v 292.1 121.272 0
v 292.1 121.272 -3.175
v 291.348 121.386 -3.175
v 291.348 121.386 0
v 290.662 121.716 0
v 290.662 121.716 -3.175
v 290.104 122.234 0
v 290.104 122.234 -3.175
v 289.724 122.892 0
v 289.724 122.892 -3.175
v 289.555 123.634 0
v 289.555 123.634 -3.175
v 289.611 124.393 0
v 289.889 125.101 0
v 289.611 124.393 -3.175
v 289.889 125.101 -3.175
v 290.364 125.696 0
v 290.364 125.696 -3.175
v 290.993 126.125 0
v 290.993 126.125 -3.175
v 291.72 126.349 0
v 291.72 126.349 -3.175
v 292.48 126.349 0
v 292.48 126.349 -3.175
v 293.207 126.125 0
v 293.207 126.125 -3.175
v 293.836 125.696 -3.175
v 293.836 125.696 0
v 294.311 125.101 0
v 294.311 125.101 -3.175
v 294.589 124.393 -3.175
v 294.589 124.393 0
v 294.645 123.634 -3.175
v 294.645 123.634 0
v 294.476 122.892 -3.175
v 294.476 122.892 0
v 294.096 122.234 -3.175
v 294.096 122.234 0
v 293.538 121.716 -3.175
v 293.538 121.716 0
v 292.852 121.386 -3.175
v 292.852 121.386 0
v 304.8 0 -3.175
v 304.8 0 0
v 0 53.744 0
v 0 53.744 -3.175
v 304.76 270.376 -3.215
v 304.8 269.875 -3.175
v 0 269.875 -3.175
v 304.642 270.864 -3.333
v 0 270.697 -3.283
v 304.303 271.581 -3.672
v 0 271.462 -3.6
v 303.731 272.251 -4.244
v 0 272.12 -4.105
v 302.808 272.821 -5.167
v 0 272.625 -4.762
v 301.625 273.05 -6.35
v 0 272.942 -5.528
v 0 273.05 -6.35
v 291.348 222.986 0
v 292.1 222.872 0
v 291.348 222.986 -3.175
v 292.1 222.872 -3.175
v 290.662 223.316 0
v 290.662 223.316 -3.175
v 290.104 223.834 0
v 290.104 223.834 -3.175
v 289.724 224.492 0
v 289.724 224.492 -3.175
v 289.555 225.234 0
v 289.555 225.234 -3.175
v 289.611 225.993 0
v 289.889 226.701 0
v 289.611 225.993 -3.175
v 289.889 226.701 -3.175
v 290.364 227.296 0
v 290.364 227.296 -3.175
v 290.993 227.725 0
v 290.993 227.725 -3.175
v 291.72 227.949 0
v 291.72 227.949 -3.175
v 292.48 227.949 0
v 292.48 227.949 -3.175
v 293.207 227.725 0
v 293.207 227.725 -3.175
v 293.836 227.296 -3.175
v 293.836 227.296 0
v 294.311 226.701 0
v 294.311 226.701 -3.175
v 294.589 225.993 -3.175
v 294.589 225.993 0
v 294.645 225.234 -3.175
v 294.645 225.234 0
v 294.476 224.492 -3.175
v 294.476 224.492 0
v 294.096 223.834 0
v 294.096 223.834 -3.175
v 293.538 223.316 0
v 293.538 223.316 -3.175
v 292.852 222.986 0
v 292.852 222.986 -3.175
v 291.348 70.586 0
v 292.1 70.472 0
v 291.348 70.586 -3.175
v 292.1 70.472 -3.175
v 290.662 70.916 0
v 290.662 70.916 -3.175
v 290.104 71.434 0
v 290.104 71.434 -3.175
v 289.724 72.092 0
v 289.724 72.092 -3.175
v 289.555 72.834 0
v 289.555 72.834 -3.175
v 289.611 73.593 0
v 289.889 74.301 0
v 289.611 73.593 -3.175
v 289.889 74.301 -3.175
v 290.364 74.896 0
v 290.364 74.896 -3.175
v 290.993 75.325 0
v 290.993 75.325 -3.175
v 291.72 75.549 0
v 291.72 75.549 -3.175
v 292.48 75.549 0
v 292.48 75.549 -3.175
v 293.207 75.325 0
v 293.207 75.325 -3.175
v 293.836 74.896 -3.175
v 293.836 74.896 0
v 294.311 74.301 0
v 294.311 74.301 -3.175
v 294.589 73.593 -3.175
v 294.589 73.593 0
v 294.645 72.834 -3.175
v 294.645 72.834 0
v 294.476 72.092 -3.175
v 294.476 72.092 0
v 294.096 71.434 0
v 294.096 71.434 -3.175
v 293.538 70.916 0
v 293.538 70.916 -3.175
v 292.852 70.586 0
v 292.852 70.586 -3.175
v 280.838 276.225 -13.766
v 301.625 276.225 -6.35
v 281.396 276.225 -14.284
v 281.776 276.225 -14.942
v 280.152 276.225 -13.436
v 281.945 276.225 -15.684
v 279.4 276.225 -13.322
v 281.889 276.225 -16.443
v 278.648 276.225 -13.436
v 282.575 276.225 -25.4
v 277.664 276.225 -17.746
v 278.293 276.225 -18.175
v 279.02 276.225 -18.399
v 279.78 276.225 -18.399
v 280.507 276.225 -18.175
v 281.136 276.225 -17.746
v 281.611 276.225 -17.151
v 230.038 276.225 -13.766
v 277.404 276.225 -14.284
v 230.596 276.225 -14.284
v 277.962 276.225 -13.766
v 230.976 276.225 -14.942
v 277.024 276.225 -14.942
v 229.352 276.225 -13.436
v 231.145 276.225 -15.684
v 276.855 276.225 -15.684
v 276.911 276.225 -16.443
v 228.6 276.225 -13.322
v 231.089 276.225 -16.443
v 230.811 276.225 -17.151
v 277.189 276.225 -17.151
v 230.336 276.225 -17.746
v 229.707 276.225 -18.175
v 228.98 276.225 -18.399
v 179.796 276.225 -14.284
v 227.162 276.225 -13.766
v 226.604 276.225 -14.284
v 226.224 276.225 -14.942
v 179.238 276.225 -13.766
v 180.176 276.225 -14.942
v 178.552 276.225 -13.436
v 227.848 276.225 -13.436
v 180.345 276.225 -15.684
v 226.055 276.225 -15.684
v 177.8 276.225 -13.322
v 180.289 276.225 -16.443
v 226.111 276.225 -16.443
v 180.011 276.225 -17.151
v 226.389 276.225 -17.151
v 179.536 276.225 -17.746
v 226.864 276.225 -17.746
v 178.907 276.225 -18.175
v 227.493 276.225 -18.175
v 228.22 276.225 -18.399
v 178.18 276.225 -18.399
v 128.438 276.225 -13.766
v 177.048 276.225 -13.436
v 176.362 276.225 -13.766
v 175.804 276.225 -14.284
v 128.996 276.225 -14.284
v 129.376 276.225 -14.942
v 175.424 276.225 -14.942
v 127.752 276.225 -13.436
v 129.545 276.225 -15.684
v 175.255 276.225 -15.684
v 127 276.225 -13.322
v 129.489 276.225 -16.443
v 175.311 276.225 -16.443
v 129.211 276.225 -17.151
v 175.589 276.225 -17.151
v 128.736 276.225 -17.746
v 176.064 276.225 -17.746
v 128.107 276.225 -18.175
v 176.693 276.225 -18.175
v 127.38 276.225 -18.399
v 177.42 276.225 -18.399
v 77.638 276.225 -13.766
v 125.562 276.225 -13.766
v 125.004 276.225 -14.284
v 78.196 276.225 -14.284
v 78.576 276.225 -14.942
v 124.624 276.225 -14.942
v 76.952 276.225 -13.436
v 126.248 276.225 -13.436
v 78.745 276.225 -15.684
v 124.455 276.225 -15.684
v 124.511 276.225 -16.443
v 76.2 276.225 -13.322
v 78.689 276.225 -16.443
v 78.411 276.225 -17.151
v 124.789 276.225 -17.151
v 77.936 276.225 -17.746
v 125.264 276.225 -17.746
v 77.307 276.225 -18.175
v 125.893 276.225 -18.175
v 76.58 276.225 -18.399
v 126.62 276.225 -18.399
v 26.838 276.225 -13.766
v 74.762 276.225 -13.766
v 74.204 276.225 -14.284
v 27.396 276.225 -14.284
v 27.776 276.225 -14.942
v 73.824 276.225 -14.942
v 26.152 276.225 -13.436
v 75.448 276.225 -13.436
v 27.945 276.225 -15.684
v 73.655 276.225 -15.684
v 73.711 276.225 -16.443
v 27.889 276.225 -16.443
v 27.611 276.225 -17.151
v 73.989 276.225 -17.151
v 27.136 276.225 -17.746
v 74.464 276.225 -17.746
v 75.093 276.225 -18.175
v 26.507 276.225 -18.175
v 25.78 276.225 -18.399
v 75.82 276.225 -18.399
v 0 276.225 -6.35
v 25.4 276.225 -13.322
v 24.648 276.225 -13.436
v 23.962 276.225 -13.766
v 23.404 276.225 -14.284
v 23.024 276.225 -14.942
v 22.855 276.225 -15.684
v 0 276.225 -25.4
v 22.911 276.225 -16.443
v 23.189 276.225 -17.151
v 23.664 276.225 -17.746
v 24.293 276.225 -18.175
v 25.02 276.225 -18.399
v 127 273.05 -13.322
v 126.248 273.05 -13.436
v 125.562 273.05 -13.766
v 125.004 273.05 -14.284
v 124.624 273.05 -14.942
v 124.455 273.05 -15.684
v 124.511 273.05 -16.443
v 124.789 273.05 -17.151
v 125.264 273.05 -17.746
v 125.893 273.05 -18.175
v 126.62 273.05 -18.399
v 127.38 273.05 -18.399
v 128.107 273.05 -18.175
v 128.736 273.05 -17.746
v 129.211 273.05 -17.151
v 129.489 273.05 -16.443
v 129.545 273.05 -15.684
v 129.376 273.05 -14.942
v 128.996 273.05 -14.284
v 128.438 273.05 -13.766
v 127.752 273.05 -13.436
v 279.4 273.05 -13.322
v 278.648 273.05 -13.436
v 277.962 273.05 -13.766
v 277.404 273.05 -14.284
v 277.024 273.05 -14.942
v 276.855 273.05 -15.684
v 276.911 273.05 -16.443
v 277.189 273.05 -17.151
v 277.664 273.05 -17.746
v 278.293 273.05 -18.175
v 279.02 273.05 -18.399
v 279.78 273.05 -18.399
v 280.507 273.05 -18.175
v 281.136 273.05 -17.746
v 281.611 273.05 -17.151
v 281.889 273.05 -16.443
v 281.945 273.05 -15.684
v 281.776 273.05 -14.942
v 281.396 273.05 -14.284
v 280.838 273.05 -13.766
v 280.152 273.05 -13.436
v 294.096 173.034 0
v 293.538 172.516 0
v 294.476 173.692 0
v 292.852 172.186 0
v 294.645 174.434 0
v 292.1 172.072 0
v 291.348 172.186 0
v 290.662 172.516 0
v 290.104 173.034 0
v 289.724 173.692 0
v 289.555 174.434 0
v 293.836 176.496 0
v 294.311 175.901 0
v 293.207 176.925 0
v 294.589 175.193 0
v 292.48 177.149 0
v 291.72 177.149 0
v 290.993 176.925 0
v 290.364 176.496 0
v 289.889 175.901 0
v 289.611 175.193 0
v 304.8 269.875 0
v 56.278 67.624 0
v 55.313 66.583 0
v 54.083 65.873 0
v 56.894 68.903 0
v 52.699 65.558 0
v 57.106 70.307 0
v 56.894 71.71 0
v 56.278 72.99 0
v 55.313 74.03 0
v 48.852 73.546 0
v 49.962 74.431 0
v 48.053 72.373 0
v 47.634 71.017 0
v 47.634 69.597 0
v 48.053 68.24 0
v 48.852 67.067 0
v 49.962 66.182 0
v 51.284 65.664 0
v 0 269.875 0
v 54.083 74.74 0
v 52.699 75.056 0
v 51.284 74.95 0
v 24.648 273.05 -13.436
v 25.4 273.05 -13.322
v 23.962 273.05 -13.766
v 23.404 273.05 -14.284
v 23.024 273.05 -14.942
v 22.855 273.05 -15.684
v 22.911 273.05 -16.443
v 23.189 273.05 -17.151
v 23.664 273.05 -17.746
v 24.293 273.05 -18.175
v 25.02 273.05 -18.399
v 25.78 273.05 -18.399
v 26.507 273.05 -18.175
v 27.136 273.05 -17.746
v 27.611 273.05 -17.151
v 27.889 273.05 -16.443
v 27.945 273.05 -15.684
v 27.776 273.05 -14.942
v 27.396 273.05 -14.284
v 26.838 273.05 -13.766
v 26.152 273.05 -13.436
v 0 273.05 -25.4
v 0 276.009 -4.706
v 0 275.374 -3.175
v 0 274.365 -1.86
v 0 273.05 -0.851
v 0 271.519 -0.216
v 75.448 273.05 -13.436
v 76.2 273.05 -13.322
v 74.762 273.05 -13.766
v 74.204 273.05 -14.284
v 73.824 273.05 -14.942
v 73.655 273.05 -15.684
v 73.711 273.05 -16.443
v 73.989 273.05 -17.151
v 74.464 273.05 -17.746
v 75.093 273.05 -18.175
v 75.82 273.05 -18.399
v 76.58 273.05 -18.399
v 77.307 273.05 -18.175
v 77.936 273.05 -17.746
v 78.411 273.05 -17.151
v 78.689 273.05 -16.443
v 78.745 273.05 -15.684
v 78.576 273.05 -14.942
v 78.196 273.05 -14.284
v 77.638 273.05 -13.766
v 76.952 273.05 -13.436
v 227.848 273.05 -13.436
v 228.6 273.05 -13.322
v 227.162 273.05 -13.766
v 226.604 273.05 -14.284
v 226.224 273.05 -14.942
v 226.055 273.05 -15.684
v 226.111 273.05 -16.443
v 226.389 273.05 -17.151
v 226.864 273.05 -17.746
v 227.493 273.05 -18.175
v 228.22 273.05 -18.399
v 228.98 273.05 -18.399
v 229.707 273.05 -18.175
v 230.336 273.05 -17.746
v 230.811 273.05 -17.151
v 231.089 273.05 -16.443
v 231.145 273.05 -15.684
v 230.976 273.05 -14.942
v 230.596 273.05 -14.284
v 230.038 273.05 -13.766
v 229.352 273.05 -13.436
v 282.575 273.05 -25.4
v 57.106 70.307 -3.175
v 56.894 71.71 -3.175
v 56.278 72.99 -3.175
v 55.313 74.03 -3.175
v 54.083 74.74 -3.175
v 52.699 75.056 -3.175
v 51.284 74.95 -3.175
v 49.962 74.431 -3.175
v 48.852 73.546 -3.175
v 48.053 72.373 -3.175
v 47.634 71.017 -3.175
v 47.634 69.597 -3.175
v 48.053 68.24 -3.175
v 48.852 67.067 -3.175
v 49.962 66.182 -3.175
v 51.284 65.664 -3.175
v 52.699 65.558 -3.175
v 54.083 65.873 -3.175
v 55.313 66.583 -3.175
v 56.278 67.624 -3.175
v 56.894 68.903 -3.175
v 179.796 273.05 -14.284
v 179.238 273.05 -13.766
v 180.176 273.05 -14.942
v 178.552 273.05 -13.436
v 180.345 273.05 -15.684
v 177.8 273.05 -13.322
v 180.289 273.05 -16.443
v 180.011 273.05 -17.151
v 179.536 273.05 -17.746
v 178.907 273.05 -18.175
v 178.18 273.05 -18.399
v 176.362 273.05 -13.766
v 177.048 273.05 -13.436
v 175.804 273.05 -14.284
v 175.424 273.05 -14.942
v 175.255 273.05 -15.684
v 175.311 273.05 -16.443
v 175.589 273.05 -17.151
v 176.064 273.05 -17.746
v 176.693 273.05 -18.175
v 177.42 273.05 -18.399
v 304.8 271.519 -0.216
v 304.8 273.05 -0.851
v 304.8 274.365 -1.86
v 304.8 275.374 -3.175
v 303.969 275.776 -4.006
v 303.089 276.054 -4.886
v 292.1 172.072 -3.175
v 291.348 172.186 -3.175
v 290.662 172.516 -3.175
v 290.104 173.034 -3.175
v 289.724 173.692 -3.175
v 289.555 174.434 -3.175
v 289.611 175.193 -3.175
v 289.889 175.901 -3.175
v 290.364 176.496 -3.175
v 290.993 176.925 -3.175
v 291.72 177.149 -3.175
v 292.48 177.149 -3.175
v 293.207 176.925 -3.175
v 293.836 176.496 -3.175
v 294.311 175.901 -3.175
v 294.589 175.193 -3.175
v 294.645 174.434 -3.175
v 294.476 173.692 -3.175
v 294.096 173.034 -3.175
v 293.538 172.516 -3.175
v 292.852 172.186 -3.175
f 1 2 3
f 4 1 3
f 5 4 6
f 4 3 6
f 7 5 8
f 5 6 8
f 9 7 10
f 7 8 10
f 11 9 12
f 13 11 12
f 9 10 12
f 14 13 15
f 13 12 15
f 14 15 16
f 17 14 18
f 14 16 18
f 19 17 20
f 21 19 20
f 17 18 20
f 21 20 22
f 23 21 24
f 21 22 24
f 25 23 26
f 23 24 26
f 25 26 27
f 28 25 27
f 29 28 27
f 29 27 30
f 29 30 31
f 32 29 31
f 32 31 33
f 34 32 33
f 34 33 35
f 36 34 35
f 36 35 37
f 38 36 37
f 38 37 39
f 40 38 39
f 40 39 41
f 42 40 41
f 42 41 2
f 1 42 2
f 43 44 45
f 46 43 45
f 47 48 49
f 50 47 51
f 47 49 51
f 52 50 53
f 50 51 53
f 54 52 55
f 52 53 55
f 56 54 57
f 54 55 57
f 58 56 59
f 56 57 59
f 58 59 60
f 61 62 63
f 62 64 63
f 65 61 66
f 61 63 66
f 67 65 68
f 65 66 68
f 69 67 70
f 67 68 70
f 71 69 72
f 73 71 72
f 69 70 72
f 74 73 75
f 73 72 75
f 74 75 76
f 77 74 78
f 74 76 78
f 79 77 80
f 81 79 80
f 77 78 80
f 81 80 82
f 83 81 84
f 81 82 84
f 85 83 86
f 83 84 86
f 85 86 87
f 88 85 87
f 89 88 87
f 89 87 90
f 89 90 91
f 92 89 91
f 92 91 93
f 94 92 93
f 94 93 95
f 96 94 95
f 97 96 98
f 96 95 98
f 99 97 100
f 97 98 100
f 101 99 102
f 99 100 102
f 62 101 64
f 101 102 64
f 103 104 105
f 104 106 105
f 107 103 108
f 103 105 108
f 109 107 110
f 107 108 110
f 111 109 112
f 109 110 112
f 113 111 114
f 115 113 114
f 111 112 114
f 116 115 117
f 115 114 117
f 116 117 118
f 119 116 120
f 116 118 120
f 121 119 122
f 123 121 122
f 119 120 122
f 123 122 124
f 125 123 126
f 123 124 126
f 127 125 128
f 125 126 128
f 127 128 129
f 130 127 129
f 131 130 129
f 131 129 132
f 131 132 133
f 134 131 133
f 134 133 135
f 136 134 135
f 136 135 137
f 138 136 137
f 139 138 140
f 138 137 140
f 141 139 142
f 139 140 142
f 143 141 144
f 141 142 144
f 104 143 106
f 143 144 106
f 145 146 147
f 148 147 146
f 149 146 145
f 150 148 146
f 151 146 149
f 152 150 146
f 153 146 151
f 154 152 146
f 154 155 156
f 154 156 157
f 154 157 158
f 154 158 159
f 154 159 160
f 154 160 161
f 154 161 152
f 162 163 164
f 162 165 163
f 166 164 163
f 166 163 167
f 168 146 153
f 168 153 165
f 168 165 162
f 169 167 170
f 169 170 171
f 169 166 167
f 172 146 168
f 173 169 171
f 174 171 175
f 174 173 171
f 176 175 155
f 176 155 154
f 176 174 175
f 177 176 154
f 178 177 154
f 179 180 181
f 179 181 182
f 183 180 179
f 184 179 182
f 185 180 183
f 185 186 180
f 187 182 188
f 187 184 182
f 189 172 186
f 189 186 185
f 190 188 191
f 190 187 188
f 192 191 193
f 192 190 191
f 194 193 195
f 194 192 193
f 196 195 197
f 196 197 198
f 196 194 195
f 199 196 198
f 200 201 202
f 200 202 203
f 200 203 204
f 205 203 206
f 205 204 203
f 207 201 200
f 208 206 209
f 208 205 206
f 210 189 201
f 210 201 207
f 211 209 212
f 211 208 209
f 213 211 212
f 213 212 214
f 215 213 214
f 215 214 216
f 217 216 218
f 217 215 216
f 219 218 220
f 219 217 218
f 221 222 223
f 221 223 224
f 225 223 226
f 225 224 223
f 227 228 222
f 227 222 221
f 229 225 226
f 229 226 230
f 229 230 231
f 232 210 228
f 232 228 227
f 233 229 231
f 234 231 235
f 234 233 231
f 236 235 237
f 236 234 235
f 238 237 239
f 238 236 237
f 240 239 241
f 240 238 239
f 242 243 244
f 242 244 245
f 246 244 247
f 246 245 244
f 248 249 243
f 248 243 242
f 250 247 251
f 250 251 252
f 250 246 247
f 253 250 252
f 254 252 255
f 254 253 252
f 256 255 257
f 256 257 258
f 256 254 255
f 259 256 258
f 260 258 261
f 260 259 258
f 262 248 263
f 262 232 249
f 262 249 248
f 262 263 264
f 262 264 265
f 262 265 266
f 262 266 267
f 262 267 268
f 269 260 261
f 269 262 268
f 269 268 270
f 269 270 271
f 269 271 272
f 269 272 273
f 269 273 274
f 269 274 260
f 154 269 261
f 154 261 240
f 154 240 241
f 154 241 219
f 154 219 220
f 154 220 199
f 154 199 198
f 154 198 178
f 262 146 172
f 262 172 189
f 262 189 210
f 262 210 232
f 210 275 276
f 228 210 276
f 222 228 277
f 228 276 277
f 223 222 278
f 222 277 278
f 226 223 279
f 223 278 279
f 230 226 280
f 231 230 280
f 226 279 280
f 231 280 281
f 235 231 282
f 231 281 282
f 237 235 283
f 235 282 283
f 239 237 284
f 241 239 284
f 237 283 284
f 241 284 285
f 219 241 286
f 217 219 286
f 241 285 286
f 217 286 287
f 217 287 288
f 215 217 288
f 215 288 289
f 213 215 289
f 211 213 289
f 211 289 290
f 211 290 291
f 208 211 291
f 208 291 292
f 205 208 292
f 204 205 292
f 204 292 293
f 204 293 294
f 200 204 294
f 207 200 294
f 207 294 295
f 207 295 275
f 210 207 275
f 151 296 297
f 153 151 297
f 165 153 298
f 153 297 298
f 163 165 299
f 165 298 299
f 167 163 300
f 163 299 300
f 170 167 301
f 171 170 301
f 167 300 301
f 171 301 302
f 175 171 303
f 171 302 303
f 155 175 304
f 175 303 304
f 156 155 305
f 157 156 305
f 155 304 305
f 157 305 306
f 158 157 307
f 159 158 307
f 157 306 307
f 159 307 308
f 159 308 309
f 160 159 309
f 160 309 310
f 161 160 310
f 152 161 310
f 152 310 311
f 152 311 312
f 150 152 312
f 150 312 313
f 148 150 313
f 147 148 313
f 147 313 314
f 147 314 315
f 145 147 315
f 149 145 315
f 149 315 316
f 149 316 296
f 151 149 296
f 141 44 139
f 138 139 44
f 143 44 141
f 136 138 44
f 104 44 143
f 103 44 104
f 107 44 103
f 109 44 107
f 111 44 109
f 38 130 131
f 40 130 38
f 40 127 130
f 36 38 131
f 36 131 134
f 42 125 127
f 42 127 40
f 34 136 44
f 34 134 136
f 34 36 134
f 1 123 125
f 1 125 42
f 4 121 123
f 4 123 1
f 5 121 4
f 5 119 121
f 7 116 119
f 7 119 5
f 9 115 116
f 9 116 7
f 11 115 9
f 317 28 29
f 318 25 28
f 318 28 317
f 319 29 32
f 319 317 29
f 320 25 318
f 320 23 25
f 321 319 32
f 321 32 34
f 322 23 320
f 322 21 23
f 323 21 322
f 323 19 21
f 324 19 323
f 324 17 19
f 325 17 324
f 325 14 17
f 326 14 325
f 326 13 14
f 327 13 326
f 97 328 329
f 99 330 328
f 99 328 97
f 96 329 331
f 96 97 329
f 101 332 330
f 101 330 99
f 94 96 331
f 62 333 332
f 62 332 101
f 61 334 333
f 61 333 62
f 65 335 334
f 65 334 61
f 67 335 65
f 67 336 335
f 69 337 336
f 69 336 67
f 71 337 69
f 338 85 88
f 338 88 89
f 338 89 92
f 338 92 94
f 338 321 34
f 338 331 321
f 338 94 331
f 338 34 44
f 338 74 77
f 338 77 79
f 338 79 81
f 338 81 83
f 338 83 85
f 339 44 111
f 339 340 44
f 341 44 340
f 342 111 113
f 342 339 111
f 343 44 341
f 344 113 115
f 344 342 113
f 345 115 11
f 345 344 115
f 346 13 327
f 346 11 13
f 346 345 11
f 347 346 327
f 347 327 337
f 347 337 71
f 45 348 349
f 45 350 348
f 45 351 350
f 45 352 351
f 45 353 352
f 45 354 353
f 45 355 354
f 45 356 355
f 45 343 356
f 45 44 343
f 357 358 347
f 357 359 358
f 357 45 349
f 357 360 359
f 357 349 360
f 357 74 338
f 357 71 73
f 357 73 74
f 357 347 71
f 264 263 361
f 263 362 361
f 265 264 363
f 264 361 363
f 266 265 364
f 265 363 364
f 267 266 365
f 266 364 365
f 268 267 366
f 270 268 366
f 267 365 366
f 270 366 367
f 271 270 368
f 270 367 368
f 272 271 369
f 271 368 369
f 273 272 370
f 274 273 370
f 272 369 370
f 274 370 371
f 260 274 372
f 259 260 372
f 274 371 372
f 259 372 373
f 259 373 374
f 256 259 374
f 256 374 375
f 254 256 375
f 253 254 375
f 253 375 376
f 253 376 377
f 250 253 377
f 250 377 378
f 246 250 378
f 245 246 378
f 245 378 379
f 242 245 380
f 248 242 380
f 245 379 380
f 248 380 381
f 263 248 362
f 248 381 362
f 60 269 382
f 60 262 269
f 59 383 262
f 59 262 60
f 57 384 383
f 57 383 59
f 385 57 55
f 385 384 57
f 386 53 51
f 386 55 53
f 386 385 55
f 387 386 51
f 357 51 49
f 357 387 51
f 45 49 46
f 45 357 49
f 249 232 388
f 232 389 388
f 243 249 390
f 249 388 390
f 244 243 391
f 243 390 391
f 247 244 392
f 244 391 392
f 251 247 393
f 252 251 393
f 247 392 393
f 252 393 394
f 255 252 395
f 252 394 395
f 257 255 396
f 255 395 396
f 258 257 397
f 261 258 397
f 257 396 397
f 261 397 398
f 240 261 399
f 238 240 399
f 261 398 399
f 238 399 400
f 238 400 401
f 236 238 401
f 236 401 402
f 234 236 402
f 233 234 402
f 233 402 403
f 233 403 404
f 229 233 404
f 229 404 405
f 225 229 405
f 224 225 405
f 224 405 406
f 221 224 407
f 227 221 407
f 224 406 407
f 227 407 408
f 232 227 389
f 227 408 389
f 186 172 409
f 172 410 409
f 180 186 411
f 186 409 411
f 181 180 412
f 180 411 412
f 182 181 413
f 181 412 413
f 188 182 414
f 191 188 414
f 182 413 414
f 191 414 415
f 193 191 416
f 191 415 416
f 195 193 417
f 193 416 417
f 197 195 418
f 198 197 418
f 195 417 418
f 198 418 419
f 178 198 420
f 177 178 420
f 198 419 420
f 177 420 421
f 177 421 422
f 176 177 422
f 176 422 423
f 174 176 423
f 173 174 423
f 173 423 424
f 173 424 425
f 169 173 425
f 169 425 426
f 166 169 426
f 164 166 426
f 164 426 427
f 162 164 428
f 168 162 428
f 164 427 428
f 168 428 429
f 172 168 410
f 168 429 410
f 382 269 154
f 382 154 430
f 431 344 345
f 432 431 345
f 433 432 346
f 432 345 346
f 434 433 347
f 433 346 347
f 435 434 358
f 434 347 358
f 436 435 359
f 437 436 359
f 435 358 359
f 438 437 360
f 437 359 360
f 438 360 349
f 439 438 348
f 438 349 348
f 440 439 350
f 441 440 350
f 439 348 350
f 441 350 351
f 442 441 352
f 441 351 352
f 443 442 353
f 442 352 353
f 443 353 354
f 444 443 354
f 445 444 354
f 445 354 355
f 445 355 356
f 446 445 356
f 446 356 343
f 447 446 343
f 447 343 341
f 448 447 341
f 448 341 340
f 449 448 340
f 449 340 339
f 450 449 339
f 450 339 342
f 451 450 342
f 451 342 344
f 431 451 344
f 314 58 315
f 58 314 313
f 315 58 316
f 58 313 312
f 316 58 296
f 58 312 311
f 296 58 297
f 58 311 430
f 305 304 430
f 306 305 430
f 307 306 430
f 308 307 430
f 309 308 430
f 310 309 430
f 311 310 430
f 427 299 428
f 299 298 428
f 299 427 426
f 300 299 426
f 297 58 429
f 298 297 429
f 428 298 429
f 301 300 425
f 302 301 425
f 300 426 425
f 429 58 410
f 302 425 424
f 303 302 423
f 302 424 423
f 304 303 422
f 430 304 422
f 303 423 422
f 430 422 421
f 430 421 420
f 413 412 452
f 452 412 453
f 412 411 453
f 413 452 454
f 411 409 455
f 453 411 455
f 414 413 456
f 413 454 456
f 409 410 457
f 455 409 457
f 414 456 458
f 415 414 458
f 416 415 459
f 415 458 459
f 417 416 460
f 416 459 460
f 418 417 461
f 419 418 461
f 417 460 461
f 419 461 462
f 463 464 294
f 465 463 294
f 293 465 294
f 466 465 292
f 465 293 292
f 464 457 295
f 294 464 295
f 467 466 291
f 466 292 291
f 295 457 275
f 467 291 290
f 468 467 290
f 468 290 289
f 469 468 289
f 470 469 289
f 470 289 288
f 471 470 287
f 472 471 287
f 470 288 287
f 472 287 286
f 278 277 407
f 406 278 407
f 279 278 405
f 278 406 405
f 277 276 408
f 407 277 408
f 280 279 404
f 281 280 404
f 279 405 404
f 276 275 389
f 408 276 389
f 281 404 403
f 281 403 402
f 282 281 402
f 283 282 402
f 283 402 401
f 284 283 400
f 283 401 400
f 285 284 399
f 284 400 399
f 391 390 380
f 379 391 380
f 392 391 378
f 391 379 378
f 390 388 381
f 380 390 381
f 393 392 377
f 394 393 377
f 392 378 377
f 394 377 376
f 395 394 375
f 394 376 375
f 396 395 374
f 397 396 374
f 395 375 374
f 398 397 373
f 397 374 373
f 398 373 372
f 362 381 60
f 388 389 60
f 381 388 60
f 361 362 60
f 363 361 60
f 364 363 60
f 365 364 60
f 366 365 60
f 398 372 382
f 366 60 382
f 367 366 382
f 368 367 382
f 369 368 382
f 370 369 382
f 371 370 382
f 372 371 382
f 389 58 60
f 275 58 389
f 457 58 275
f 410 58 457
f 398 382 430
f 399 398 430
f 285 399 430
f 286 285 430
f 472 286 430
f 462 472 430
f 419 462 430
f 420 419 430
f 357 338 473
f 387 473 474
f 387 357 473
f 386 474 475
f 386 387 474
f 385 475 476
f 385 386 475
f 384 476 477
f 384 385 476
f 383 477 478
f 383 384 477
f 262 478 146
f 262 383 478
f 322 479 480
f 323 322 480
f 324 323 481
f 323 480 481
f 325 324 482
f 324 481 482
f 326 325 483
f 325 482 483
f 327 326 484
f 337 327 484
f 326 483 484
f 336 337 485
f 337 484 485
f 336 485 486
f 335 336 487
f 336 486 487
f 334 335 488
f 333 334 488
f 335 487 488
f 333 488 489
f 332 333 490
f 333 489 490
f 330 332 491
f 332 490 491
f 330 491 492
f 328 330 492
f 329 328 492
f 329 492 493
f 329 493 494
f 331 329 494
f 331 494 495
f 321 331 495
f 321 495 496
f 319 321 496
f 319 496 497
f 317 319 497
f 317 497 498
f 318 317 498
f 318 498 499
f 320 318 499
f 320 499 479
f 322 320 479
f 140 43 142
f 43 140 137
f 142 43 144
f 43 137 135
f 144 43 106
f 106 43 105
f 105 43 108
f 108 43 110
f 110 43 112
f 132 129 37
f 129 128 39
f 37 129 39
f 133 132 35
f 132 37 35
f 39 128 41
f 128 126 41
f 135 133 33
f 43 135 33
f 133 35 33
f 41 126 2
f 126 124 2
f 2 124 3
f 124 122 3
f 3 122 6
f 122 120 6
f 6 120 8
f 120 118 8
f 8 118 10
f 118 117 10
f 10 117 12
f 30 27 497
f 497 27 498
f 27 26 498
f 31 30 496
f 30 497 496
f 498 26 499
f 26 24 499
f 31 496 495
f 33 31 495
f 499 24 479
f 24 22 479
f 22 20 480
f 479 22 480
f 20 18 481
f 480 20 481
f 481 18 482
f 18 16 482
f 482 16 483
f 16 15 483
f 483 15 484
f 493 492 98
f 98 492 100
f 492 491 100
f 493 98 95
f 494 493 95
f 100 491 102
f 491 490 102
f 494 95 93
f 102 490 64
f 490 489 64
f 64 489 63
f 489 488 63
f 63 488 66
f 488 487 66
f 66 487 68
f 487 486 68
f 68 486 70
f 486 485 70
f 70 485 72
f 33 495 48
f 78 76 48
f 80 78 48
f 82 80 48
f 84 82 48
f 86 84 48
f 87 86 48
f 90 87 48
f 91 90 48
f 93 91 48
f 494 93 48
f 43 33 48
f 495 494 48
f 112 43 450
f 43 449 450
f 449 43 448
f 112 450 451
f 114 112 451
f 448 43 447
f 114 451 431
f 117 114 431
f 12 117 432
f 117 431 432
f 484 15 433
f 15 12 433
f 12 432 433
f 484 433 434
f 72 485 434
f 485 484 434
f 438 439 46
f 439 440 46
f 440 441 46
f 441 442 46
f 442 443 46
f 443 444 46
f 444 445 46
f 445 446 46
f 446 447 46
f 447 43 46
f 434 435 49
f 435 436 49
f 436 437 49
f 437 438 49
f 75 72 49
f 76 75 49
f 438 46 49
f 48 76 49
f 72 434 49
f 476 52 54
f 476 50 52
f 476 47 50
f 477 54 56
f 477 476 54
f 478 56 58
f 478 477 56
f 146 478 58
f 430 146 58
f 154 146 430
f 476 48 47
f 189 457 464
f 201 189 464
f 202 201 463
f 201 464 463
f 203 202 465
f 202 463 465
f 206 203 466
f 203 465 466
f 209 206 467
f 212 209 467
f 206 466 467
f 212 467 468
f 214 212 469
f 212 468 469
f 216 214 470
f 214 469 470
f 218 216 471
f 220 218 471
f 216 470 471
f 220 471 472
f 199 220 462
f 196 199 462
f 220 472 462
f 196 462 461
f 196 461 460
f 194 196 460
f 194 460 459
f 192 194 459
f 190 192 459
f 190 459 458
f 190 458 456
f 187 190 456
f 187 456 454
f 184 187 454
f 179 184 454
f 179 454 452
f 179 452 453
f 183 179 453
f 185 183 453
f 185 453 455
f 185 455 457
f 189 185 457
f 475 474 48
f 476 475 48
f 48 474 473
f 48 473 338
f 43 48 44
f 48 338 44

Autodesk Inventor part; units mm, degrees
ref_plane "YZ Plane" through (0, 0, 0) normal (1, 0, 0) x (0, 1, 0)
ref_plane "XZ Plane" through (0, 0, 0) normal (0, 1, 0) x (-1, 0, 0)
ref_plane "XY Plane" through (0, 0, 0) normal (0, 0, 1) x (1, 0, 0)
sketch "Sketch1" plane through (0, 0, 0) normal (1, 0, 0) x (0, 1, 0)
  line L0 (0, 0) -> (276.225, 0)
  line L1 (276.225, 0) -> (276.225, -25.4)
  dimension "d0" = 25.4
  dimension "d1" = 276.225
contour flange "Contour Flange1" sketch "Sketch1" thickness 3.175 bend radius 3.175 width 304.8 along (1, 0, 0) mid plane no both sides no wall seen from (0, 138.1125, 0) lies toward (0, 0, -1) curves L0 L1
bend "Bend1"
corner "Corner1"
sketch "Sketch2" plane through (0, 0, 0) normal (0, 0, 1) x (1, 0, 0)
  line L0 (304.8, 0) -> (304.8, 269.875) projected
  line L1 (304.8, 0) -> (0, 53.7445)
  line L2 (0, 0) -> (0, 269.875) projected
  line L3 (0, 269.875) -> (304.8, 269.875) projected
  line L4 (0, 0) -> (0, 269.875) projected
  line L5 (304.8, 0) -> (0, 0) projected
  line L6 (304.8, 269.875) -> (304.8, 0) projected
  dimension "d13" = 10
extrude "Cut1" cut sketch "Sketch2" against normal blind 3.175 contours L5 L2 L1
sketch "Sketch3" plane through (0, 276.225, -25.4) normal (0, 1, 0) x (1, 0, 0)
  line L0 (304.8, -22.225) -> (282.575, 0)
  line L1 (0, 0) -> (304.8, 0) projected
  line L2 (304.8, 0) -> (304.8, -19.05) projected
  line L3 (304.8, 0) -> (304.8, -22.225)
  point P0 (0, -25.4)
  dimension "d16" = 45
extrude "Cut2" cut sketch "Sketch3" against normal through all
sketch "Sketch4" plane through (0, 269.875, 0) normal (0, 0, 1) x (1, 0, 0)
  line L0 (304.8, 0) -> (304.8, -269.875) projected
  point P0 (0, -269.875)
  point P1 (292.1, -196.85)
  point P2 (292.1, -146.05)
  point P3 (292.1, -95.25)
  point P4 (292.1, -44.45)
  dimension "d19" = 73.025
  dimension "d20" = 12.7
  dimension "d23" = 50.8
hole "Hole1" at (292.1, 73.025, 0) at (292.1, 123.825, 0) at (292.1, 174.625, 0) at (292.1, 225.425, 0) direction (0, 0, -1) diameter 5.105 end through all clearance for "Flat Head Machine Screw (82)" size "#10" standard "Ansi Unified Screw Threads"
sketch "Sketch5" plane through (0, 276.225, -6.35) normal (0, 1, 0) x (1, 0, 0)
  line L0 (0, 19.05) -> (282.575, 19.05) projected
  line L1 (0, 0) -> (0, 19.05) projected
  point P0 (0, -6.35)
  point P1 (25.4, 9.525)
  point P2 (76.2, 9.525)
  point P3 (127, 9.525)
  point P4 (177.8, 9.525)
  point P5 (228.6, 9.525)
  point P6 (279.4, 9.525)
  dimension "d35" = 9.525
  dimension "d36" = 25.4
  dimension "d39" = 50.8
hole "Hole2" at (25.4, 276.225, -15.875) at (76.2, 276.225, -15.875) at (127, 276.225, -15.875) at (177.8, 276.225, -15.875) at (228.6, 276.225, -15.875) at (279.4, 276.225, -15.875) direction (0, -1, 0) diameter 5.105 end through all clearance for "Flat Head Machine Screw (82)" size "#10" standard "Ansi Unified Screw Threads"
sketch "Sketch6" plane through (0, 269.875, 0) normal (0, 0, 1) x (1, 0, 0)
  circle A0 centre (52.3434, -199.5683) radius 4.7625
  line L0 (0, -216.1305) -> (304.8, -269.875) projected
  line L1 (0, -216.1305) -> (0, 0) projected
  point P0 (0, -269.875)
  dimension "d51" = 9.525
  dimension "d52" = 25.4
  dimension "d53" = 52.3434
extrude "Cut3" cut sketch "Sketch6" against normal blind 3.175
equation "\"d14\" = Thickness"
equation "\"d17\" = Thickness"
equation "\"d33\" = Thickness"
equation "\"d54\" = Thickness"
equation "\"d2\" = Thickness"
equation "\"d3\" = BendReliefWidth"
equation "\"d4\" = BendReliefDepth"
equation "\"d5\" = MinimumRemnant"
equation "\"d6\" = TransitionRadius"
equation "\"d8\" = BendRadius"
equation "\"d10\" = CornerReliefSize"
equation "\"d11\" = GapSize"
equation "\"d12\" = JacobiRadiusSize"
equation "\"BendRadius\" = Thickness"
equation "\"BendReliefWidth\" = Thickness"
equation "\"BendReliefDepth\" = 0.5 * Thickness"
equation "\"CornerReliefSize\" = 4 * Thickness"
equation "\"MinimumRemnant\" = 2 * Thickness"
equation "\"TransitionRadius\" = BendRadius"
equation "\"JacobiRadiusSize\" = BendRadius"
equation "\"GapSize\" = Thickness"
equation "\"Thickness\" = 3.175"
properties part number "SIDE_INTAKE_LEXAN" material "Polycarbonate, PC 1000, Clear"
